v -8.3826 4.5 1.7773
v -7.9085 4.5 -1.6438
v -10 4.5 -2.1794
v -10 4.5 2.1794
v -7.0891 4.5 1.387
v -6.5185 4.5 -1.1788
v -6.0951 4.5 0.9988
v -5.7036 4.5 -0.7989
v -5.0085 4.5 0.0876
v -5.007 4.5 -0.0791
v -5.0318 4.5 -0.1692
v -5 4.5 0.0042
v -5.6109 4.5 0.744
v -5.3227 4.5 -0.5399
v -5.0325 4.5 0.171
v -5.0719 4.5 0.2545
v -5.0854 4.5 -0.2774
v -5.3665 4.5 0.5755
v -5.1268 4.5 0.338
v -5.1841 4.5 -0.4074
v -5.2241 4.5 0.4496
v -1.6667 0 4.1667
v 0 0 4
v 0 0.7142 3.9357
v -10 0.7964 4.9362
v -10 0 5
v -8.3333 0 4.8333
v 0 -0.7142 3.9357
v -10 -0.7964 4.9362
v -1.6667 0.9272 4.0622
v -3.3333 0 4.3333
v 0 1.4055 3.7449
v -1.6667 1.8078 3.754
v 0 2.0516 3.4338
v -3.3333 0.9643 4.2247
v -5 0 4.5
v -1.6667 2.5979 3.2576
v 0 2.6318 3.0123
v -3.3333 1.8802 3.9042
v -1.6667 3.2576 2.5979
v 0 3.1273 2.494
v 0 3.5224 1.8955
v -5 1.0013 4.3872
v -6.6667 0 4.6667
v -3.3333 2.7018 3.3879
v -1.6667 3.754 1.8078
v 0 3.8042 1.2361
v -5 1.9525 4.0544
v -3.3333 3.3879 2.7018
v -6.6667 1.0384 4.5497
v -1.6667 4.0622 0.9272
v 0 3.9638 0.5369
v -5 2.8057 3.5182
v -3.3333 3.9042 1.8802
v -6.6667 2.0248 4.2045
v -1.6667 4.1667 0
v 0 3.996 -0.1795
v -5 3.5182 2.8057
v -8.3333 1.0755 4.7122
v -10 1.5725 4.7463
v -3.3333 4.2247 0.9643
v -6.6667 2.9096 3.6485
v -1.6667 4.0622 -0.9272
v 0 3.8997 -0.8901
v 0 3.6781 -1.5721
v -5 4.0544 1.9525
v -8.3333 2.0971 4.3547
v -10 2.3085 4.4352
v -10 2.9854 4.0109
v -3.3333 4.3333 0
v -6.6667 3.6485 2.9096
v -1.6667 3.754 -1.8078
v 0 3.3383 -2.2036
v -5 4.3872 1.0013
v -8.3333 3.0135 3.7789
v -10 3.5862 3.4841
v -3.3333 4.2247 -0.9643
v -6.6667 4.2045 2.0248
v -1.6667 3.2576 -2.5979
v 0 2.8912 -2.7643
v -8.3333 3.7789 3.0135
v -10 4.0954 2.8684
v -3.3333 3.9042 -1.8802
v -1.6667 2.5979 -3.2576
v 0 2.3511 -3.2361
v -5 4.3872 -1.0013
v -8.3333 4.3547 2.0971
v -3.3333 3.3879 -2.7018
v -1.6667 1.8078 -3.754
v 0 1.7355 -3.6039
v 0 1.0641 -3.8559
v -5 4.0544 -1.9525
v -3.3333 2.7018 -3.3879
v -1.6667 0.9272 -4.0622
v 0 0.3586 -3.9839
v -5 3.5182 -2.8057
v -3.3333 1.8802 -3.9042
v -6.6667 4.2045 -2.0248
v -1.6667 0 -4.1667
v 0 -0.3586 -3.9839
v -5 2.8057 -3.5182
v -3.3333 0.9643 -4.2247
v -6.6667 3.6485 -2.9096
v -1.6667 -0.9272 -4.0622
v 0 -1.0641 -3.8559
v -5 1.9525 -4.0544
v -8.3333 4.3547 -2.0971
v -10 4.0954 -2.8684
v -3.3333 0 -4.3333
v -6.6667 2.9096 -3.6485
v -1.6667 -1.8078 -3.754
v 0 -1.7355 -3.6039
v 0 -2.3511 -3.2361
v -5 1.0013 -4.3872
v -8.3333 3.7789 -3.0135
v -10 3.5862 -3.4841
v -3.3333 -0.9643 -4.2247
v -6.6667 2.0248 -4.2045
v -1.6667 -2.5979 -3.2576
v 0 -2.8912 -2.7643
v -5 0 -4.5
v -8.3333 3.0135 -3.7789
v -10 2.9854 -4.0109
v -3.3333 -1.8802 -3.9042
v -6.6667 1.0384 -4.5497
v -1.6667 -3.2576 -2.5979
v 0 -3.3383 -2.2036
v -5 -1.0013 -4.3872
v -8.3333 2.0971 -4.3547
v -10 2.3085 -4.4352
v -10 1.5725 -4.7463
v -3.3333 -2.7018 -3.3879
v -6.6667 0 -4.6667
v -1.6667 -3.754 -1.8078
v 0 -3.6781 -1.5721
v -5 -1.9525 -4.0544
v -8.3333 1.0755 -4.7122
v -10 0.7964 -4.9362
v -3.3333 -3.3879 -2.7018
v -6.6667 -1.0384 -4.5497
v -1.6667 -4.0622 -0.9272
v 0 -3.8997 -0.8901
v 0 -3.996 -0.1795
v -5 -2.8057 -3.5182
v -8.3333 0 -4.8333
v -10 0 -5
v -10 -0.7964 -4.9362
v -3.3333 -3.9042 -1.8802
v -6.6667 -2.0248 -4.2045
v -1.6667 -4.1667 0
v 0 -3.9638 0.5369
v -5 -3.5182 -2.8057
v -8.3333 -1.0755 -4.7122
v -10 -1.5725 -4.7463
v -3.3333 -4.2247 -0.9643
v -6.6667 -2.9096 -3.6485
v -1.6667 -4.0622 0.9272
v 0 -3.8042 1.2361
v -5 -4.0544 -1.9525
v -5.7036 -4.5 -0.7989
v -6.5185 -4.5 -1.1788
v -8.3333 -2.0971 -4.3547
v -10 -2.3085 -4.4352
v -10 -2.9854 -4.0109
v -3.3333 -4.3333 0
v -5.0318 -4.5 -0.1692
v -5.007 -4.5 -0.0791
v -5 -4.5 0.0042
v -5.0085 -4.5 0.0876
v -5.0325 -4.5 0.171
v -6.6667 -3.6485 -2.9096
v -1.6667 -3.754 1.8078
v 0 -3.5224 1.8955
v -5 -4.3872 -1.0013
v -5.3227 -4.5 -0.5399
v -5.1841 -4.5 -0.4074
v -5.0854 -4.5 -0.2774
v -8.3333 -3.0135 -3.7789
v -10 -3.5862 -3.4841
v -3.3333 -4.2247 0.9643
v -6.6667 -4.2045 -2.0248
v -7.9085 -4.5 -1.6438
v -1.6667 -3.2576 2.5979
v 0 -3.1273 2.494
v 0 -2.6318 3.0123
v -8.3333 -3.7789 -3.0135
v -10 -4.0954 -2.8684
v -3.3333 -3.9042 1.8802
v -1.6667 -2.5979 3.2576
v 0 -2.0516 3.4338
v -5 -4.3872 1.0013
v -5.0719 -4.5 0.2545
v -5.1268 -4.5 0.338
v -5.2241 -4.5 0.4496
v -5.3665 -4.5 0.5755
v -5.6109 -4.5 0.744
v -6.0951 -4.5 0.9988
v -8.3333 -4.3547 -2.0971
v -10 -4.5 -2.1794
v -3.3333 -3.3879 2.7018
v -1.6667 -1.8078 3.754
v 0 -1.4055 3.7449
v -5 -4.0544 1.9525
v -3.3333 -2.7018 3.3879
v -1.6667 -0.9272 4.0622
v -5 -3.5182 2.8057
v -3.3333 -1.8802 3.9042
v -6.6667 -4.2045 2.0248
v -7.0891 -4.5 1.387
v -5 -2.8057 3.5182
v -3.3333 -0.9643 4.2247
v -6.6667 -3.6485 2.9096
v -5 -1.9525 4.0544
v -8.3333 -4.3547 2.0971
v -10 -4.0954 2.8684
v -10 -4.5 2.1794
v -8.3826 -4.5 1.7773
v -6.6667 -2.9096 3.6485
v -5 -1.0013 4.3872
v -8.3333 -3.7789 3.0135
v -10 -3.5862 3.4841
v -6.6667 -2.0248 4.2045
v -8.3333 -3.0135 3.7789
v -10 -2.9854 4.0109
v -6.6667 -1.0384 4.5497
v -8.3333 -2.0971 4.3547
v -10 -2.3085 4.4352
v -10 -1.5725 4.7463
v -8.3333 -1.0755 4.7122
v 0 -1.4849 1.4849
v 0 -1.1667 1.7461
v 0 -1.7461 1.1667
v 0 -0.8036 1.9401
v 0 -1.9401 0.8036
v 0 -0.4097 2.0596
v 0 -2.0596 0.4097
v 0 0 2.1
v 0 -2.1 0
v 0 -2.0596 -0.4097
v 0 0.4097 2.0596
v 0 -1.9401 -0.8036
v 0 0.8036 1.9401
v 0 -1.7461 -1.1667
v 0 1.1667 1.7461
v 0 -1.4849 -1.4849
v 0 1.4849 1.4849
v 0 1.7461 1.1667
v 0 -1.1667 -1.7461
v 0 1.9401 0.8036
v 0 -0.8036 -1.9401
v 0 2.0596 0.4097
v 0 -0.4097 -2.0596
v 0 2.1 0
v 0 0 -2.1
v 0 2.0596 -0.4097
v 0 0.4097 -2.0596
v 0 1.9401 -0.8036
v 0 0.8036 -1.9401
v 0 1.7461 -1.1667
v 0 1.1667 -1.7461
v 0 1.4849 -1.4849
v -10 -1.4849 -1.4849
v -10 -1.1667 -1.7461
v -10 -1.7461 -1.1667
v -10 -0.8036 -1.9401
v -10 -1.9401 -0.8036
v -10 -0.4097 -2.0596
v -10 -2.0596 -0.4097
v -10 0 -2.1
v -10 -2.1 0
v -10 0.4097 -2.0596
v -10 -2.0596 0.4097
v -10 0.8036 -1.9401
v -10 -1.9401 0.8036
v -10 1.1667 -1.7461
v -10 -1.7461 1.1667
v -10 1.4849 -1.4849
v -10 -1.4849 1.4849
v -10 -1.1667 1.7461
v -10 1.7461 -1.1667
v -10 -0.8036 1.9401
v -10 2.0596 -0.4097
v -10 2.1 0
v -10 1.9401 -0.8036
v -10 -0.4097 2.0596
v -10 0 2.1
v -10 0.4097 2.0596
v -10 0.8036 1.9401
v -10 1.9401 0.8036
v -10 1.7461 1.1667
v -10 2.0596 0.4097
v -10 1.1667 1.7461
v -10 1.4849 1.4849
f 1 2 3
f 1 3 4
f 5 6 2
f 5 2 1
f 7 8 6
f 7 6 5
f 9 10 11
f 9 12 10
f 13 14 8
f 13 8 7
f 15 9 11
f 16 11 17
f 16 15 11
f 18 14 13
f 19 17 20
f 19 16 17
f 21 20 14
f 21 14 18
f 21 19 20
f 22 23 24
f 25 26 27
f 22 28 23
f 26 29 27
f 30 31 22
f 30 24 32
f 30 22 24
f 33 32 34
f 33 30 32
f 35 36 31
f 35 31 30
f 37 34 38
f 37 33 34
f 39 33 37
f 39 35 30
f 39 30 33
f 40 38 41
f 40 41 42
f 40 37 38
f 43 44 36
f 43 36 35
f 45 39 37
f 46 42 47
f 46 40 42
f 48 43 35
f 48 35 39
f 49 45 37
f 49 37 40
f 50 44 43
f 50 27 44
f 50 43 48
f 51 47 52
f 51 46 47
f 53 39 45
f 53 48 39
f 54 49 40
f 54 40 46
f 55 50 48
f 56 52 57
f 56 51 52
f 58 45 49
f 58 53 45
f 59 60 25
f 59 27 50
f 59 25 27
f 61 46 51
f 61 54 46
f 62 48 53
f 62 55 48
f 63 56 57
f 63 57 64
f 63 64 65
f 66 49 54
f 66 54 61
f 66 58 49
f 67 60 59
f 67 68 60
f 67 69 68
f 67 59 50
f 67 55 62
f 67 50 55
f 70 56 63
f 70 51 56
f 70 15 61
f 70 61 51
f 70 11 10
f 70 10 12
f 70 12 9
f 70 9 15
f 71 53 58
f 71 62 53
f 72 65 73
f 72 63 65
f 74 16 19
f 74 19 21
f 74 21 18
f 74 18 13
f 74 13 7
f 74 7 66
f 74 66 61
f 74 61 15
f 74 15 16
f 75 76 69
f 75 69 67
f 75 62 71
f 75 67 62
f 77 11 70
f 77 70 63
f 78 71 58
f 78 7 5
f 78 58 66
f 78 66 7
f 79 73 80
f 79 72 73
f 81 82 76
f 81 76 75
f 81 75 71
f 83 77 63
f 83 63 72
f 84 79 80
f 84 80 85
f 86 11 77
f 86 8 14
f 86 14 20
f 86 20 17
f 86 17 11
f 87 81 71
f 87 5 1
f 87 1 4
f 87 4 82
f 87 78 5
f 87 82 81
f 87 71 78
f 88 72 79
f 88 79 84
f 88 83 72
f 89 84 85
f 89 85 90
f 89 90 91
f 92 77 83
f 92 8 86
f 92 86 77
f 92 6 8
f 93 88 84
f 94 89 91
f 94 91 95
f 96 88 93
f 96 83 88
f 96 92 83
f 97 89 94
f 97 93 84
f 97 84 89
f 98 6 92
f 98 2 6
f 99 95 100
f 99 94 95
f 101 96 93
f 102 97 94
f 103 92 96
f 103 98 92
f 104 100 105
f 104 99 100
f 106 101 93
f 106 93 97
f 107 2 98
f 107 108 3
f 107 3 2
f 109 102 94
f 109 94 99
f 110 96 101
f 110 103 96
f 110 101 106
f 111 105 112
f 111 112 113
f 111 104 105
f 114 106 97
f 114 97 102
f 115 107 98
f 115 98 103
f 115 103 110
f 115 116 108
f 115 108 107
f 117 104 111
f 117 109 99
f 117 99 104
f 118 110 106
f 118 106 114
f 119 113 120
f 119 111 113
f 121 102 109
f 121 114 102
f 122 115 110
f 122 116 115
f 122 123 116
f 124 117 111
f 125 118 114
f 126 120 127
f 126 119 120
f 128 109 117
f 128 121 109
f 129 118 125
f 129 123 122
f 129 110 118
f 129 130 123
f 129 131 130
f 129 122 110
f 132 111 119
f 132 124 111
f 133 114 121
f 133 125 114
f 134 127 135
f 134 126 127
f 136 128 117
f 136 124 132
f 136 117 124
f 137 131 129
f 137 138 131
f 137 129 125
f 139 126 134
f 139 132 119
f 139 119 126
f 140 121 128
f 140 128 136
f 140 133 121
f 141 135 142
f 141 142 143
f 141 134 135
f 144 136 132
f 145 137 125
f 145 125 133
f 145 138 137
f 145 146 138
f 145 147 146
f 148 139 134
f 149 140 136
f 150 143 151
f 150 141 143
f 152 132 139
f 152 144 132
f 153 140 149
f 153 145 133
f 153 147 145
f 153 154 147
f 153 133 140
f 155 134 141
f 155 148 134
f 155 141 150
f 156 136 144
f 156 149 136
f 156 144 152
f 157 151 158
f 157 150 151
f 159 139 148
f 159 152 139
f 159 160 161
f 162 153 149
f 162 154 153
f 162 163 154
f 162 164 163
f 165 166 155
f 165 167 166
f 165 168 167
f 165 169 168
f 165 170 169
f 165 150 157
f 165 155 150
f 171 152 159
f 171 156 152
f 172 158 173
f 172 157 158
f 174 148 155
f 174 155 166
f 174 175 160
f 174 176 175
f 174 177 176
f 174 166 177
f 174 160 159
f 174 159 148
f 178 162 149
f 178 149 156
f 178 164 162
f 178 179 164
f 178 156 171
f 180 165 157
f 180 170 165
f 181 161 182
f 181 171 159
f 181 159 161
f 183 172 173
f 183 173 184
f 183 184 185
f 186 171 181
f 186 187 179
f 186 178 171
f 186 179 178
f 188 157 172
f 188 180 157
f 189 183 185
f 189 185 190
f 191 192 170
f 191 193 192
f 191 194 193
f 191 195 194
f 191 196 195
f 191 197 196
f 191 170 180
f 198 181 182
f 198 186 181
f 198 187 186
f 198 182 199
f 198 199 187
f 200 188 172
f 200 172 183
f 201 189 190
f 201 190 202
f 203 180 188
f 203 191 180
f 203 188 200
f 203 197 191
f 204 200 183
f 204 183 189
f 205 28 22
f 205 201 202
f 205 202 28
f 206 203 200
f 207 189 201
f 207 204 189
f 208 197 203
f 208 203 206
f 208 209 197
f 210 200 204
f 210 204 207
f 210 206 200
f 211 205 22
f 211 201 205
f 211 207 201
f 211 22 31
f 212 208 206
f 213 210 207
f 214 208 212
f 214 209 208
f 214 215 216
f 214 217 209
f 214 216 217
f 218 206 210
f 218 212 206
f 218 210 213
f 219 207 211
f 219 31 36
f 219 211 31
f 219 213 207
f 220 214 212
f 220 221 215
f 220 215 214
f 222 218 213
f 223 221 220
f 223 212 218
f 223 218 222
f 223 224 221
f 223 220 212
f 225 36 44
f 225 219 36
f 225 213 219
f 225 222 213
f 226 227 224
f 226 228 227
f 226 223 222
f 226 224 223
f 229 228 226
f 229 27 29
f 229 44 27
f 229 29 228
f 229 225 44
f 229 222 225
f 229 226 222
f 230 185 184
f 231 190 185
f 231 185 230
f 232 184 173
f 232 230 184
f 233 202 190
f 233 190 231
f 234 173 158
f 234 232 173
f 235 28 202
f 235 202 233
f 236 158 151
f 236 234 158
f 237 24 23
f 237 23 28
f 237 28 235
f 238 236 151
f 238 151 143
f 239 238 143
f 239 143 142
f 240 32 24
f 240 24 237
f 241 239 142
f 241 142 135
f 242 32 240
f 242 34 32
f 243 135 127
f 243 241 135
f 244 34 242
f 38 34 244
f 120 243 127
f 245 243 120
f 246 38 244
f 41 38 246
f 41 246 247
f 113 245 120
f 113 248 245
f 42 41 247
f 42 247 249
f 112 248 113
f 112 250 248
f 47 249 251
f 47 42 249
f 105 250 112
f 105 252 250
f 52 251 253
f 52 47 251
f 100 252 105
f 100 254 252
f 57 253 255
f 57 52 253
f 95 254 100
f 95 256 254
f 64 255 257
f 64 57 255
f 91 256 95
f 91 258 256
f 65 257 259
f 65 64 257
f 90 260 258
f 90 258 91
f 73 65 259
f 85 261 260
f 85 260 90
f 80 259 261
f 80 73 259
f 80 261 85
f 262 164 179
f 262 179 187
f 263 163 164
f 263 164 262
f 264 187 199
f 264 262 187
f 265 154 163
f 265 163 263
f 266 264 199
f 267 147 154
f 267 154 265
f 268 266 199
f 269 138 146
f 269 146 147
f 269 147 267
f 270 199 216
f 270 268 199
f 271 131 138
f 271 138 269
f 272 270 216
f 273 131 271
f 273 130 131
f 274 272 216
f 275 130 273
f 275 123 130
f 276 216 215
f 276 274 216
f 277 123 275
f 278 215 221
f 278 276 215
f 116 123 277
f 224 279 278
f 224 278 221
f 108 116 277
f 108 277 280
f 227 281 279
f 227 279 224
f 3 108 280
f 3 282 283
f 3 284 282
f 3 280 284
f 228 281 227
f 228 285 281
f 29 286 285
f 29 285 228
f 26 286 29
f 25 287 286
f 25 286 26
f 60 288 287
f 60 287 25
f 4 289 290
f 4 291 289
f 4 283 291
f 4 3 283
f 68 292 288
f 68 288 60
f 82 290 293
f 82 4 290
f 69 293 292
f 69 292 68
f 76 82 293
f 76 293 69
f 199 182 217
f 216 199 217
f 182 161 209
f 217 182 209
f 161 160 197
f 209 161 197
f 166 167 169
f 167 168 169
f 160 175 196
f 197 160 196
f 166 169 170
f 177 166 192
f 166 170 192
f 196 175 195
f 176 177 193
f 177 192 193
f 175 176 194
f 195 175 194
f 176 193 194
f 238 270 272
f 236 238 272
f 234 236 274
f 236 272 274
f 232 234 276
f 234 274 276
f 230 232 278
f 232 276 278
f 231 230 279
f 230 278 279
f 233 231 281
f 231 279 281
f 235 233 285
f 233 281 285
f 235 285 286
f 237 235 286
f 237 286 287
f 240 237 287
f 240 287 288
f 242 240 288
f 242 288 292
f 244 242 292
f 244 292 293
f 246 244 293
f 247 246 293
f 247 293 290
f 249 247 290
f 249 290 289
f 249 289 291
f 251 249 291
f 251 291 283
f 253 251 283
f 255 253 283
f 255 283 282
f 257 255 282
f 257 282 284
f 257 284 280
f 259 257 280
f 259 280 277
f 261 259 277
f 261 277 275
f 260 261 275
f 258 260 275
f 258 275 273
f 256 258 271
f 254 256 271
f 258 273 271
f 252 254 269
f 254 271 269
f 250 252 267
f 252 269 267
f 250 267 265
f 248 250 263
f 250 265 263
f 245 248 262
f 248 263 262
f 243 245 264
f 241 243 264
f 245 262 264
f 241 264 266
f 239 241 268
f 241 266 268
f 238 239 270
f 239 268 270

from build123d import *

# Parameters (mm, degrees)
F2_W     = 9
F2_H     = 15
F3_DEPTH = 10.001
F5_D     = 4.2


with BuildPart() as f1:
    # F0 (on Front) → F1 (revolve)
    with BuildSketch(Plane.XZ):
        Polygon((-10, 0), (0, 0), (0, 4), (-10, 5), align=None)
    revolve(axis=Axis((-5, 0, 0), (-1, 0, 0)))

    # F2 (on face) → F3 (intersect, through all)
    with BuildSketch(Plane.YZ):
        Rectangle(F2_W, F2_H)
    extrude(amount=-F3_DEPTH, mode=Mode.INTERSECT)

    # F5 (through all)
    with Locations(Plane.YZ):
        with Locations((0, 0)):
            Hole(F5_D / 2)


solid = f1.part
